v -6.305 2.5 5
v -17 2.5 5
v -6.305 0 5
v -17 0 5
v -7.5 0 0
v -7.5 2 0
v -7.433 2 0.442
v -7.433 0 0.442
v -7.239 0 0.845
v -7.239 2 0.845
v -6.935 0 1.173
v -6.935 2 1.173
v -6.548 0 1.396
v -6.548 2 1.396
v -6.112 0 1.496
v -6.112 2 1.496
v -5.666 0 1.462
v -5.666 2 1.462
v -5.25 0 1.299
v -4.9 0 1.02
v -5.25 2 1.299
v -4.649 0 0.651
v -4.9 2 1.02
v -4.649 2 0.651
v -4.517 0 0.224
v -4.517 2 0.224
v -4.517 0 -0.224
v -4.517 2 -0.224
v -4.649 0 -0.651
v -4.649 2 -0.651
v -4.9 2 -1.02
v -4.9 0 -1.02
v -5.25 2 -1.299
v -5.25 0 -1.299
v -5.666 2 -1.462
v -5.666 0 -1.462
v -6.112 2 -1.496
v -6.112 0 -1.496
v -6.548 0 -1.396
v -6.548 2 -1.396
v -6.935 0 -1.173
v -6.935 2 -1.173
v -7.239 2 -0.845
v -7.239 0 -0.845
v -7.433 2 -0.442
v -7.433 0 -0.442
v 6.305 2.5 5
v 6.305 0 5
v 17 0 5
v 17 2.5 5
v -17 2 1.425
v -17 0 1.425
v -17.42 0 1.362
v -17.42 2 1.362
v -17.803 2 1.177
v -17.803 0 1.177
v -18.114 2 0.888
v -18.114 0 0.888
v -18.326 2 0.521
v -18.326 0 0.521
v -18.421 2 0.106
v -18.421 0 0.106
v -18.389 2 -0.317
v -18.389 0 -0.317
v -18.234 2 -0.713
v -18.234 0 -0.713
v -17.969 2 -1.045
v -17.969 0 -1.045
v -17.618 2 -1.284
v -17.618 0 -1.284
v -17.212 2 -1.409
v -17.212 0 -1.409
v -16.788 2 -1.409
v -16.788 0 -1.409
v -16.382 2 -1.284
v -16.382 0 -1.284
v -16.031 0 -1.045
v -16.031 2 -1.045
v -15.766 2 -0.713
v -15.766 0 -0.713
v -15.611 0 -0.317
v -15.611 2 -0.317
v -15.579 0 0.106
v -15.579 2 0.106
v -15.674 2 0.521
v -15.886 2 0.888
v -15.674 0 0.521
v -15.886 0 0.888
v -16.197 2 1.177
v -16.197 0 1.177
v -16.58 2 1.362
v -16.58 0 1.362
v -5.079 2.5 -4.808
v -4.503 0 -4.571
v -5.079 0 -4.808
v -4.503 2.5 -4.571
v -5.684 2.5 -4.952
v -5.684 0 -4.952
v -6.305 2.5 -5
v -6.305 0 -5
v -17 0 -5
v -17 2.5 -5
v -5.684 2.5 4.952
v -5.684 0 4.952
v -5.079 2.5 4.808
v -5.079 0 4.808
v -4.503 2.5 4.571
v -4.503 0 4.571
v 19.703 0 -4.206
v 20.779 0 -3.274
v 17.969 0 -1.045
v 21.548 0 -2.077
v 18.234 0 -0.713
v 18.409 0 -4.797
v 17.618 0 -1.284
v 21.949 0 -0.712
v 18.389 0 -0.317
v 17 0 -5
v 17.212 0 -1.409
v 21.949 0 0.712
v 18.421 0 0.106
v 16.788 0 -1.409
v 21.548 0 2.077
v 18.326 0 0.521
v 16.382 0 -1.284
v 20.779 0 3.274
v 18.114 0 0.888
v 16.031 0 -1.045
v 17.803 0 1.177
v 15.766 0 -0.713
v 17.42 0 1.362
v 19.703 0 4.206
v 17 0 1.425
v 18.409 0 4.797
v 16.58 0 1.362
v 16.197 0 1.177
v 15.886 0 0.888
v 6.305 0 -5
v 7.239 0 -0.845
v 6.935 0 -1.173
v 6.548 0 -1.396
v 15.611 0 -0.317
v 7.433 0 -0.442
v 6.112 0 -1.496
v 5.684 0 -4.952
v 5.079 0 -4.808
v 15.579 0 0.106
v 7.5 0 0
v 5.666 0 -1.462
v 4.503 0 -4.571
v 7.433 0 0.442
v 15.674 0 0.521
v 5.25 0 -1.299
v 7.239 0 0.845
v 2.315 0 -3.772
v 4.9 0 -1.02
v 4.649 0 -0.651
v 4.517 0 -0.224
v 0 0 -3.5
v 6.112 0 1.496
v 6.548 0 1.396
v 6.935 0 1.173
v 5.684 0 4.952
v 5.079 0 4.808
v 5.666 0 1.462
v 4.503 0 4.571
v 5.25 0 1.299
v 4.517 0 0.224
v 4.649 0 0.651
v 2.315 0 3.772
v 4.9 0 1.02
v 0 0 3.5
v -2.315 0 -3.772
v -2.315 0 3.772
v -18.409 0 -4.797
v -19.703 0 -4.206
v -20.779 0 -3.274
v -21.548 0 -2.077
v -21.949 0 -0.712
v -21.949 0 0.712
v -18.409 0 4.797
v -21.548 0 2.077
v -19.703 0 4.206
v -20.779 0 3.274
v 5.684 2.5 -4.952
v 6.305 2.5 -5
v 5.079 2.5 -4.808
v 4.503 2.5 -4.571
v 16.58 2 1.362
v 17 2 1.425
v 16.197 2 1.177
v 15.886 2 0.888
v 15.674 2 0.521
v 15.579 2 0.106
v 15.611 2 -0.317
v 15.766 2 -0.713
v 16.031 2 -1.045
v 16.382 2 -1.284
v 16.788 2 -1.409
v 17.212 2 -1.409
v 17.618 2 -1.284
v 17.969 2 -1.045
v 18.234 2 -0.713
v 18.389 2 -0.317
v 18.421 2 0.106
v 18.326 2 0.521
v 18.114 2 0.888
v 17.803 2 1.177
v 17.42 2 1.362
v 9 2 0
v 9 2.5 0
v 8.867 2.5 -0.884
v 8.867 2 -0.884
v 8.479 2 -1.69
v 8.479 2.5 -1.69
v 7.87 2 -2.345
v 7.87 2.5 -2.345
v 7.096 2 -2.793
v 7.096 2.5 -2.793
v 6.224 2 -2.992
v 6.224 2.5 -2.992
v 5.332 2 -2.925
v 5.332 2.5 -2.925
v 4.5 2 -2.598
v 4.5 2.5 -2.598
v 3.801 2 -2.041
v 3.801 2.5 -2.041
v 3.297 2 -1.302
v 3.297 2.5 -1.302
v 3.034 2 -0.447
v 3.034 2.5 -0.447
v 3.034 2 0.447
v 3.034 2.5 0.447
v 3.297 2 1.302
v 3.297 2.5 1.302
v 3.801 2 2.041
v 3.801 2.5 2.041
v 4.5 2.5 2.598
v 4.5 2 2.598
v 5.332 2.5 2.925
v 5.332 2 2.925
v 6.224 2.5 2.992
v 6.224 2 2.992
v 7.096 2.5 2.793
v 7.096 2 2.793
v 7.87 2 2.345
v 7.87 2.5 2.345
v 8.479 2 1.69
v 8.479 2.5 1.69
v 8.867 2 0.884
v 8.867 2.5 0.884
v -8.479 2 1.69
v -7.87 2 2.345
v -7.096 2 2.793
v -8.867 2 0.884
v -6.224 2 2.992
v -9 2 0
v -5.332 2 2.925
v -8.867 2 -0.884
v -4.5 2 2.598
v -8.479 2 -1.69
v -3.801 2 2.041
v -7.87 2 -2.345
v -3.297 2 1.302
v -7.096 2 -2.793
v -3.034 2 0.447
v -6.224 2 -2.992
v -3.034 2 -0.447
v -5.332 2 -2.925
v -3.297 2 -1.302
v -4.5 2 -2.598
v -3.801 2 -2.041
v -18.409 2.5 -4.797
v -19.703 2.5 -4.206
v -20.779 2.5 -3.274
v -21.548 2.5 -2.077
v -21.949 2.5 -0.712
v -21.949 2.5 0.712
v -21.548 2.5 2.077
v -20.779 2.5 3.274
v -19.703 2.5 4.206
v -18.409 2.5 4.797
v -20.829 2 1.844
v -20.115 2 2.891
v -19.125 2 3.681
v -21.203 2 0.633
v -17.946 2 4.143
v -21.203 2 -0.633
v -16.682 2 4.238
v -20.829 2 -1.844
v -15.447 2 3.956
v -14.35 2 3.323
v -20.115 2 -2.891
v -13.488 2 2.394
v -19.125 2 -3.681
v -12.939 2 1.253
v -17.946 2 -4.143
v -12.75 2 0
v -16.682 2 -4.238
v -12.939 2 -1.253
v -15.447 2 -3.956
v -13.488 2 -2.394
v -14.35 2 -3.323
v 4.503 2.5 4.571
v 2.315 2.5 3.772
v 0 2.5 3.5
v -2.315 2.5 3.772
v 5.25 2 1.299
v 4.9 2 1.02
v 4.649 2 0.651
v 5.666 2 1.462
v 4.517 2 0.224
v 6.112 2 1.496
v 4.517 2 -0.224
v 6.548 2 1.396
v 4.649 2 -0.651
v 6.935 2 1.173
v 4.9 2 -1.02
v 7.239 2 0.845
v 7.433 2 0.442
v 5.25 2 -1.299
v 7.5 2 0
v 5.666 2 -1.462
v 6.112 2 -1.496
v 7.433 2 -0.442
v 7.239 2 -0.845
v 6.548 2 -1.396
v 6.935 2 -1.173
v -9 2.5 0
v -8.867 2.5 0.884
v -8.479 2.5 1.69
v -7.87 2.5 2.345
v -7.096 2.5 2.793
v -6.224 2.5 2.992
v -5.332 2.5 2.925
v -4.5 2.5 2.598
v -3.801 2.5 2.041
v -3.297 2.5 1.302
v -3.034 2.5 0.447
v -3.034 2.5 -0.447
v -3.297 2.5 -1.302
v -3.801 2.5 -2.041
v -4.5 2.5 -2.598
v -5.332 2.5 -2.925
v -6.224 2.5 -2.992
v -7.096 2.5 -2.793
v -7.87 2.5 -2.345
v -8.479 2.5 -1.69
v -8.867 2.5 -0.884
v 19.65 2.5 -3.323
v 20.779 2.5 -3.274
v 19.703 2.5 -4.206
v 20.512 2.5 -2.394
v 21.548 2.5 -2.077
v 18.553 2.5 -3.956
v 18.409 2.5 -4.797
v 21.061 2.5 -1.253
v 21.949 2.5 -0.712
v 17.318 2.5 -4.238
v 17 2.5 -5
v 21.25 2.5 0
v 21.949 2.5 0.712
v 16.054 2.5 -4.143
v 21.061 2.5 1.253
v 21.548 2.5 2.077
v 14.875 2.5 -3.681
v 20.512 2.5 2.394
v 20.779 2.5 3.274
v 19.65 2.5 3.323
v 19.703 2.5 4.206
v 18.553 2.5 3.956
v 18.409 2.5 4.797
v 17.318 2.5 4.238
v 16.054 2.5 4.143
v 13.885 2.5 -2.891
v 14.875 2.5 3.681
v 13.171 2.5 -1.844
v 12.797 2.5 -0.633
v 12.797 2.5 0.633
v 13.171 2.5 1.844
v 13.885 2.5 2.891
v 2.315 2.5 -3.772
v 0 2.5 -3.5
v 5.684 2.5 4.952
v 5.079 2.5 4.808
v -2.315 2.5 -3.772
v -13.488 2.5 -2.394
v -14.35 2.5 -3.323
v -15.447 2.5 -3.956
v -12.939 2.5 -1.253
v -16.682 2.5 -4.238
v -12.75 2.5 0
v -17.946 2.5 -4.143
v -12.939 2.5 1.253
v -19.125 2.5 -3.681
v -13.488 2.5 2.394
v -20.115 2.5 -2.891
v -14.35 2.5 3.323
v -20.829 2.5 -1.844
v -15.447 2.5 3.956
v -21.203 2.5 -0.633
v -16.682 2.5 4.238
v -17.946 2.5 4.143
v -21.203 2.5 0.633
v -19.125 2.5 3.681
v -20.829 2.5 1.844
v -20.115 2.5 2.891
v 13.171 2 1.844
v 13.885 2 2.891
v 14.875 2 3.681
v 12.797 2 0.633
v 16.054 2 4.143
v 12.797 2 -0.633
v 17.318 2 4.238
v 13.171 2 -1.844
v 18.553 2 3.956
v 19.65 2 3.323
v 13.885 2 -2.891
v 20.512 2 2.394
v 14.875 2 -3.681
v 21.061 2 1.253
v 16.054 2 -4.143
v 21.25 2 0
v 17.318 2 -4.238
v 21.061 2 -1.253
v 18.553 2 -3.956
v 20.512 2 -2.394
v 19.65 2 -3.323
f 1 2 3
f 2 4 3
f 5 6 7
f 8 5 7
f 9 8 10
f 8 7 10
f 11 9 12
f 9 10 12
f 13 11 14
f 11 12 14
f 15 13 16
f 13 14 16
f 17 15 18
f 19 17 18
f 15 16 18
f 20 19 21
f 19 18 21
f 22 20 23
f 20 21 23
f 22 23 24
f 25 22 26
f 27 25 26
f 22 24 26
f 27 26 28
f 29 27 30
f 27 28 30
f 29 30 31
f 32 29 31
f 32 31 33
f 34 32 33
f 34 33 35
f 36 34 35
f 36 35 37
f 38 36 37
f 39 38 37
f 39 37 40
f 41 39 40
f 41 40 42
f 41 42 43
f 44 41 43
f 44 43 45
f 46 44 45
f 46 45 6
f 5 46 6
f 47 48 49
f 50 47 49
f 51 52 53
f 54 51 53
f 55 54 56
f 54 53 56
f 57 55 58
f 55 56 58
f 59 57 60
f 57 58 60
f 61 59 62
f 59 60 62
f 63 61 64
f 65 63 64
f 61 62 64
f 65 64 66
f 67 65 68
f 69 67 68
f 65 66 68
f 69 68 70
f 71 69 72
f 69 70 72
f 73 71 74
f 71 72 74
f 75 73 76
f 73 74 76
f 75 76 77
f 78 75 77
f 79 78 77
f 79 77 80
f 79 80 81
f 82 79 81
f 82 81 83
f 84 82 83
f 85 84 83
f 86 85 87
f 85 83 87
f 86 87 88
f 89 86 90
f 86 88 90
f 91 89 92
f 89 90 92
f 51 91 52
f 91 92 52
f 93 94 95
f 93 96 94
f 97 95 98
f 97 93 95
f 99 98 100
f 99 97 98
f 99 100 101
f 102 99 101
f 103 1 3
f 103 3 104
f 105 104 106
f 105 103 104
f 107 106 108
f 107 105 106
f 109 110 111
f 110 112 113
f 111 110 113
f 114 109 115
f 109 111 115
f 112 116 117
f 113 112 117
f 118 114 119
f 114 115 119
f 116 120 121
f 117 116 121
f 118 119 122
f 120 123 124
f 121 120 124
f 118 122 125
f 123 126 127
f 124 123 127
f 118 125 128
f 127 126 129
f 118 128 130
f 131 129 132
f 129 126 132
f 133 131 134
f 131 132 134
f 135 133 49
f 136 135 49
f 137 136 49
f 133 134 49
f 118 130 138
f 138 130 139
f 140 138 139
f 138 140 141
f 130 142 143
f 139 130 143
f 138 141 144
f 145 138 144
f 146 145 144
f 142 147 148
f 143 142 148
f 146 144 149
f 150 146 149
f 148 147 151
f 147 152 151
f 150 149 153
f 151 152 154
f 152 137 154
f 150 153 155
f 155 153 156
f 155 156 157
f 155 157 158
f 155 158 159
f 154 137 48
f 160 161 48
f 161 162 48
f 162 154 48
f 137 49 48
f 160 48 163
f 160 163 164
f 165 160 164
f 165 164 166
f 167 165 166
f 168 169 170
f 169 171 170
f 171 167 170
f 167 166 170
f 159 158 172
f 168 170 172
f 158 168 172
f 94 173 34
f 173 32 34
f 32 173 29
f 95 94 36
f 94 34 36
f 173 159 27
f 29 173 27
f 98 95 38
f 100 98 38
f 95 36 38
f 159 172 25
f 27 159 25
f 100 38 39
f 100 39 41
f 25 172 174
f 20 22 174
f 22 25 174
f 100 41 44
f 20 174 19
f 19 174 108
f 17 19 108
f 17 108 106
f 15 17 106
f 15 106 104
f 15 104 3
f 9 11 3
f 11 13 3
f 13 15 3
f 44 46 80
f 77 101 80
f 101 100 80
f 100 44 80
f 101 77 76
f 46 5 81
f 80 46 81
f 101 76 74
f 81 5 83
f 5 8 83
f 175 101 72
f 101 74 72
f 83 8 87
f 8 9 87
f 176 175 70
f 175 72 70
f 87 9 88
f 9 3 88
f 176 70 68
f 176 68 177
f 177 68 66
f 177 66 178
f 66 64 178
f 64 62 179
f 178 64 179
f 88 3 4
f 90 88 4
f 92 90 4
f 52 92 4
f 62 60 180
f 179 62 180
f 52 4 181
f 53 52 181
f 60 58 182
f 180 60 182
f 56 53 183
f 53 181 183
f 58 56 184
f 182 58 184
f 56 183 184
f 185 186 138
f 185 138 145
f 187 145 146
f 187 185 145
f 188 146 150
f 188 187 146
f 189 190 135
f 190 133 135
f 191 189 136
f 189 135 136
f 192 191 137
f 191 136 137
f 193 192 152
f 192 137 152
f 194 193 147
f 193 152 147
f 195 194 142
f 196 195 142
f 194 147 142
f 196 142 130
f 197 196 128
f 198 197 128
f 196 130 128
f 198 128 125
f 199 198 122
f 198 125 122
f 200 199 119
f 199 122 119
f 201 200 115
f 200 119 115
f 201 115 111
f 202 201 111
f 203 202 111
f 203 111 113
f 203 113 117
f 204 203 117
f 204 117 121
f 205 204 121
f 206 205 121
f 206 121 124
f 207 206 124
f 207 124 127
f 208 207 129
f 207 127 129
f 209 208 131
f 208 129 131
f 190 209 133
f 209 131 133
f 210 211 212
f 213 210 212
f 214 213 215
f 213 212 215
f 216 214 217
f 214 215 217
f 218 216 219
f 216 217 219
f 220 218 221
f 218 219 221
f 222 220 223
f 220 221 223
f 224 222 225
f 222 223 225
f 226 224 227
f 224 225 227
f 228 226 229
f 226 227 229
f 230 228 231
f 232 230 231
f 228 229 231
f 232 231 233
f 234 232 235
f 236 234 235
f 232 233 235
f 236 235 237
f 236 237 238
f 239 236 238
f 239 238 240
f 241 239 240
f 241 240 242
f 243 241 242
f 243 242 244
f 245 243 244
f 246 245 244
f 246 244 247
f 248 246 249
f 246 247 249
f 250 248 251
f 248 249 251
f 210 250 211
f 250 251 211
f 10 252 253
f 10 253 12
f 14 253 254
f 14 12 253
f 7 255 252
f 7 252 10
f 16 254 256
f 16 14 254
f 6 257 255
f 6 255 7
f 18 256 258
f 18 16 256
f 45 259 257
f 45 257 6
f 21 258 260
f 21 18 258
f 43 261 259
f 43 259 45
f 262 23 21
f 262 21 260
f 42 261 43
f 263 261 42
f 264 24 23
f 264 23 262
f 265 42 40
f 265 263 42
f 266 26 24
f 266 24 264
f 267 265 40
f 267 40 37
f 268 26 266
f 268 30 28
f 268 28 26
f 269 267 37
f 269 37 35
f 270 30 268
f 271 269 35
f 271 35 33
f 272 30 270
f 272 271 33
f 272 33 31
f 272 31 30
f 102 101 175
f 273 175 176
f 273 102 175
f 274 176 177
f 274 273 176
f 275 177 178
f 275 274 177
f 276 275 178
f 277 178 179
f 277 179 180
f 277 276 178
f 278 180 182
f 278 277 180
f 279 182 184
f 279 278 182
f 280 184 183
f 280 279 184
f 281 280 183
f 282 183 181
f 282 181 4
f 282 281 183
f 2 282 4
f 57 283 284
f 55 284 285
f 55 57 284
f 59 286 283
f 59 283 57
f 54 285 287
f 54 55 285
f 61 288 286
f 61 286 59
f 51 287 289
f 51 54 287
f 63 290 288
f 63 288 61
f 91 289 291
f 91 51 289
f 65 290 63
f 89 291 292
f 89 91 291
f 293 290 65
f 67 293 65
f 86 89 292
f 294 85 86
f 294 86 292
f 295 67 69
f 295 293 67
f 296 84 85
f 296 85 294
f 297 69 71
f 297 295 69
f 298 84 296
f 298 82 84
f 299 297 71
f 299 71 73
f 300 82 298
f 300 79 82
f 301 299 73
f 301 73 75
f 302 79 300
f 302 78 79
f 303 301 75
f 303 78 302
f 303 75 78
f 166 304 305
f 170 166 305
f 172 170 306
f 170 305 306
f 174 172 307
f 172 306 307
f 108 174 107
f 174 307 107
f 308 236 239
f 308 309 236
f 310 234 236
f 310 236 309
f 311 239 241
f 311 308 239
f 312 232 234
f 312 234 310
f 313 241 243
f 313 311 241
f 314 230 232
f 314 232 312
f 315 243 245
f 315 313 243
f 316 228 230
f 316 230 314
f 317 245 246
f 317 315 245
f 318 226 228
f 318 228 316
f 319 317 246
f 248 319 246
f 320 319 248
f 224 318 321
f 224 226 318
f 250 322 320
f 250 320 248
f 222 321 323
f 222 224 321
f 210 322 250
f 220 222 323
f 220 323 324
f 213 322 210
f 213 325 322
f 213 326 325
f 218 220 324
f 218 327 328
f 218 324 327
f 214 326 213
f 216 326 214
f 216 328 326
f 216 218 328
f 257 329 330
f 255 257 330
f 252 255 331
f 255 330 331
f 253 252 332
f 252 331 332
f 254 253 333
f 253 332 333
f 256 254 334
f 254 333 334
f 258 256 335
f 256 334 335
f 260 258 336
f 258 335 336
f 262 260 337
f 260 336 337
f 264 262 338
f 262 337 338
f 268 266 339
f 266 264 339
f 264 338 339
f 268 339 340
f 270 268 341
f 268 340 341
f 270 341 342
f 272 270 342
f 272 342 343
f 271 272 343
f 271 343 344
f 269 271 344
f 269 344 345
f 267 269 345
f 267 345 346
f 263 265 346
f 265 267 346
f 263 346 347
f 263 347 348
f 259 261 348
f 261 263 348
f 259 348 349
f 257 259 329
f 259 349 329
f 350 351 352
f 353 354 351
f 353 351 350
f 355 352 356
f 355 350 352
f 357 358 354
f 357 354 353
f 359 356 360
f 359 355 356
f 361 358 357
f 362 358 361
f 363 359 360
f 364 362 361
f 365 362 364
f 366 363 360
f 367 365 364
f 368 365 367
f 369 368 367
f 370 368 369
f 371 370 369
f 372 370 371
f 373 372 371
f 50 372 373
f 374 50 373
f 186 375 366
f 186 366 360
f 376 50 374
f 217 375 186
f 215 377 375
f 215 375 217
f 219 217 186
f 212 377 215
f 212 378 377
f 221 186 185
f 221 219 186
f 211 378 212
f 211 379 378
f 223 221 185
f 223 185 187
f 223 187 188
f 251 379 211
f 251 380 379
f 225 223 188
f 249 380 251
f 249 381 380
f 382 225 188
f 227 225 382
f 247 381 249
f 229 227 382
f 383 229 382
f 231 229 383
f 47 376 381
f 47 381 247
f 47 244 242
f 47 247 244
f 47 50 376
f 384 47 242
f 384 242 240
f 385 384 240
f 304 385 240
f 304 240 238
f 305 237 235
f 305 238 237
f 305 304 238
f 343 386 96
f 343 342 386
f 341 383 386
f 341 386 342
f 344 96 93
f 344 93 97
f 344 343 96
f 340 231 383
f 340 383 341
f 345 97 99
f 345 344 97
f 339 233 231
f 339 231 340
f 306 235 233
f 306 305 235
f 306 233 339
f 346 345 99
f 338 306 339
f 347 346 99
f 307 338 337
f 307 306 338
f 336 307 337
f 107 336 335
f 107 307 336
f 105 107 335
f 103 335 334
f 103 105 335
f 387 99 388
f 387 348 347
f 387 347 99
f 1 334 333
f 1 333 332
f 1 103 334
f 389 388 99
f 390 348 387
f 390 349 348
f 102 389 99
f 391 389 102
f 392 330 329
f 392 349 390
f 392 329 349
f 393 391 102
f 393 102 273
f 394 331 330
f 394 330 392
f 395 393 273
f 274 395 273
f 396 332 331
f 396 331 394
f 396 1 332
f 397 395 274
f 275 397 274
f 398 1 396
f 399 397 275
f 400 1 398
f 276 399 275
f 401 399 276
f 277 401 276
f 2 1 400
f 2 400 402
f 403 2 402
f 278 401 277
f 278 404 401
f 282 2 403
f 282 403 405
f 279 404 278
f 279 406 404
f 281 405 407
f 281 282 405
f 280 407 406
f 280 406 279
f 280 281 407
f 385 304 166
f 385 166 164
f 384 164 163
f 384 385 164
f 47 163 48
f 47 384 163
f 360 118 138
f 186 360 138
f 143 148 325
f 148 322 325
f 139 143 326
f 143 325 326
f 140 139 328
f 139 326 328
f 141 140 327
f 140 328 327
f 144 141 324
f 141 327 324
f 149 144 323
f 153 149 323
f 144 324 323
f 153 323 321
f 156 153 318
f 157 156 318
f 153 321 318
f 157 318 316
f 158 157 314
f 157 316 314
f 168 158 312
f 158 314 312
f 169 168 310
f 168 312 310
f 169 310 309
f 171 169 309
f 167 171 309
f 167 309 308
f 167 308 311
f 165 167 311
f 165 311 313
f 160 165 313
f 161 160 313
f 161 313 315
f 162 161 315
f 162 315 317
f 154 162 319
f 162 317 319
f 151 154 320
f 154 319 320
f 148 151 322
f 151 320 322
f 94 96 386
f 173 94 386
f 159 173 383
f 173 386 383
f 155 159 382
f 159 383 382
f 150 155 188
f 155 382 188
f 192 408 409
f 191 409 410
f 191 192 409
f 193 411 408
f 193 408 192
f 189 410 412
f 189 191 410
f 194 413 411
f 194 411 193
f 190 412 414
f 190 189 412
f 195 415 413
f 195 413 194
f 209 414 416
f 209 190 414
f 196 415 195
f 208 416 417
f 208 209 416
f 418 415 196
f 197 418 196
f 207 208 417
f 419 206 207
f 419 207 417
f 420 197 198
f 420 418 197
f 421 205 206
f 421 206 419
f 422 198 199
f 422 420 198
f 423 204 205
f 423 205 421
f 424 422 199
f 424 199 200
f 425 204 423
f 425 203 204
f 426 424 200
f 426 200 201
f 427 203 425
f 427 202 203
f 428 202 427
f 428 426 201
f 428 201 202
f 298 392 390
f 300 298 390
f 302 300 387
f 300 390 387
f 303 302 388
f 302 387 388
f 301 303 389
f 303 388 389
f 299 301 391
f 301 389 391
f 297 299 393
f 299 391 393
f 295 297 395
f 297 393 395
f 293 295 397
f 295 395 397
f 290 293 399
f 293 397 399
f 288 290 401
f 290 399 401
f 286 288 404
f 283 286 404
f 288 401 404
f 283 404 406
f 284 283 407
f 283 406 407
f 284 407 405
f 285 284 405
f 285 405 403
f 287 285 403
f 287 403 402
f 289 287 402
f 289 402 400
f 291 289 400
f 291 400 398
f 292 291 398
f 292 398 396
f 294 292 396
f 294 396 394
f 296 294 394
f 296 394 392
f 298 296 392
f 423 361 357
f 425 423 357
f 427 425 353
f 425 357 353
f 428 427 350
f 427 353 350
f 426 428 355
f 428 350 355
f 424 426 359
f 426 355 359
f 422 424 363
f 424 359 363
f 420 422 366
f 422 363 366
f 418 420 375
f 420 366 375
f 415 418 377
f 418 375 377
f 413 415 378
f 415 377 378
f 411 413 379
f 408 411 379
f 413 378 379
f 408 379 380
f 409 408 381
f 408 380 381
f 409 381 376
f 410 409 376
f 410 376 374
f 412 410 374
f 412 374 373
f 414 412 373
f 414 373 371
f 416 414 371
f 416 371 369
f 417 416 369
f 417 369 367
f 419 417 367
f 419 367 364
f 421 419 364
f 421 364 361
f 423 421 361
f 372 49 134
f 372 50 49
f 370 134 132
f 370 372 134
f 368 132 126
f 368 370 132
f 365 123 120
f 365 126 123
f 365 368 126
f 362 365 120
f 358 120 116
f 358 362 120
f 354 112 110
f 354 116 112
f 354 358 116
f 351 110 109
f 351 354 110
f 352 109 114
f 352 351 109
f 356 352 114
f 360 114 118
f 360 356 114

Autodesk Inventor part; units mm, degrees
ref_plane "YZ Plane" through (0, 0, 0) normal (1, 0, 0) x (0, 1, 0)
ref_plane "XZ Plane" through (0, 0, 0) normal (0, 1, 0) x (-1, 0, 0)
ref_plane "XY Plane" through (0, 0, 0) normal (0, 0, 1) x (1, 0, 0)
sketch "Sketch1" plane through (0, 0, 0) normal (0, 1, 0) x (-1, 0, 0)
  line L0 (17, 5) -> (-17, 5)
  line L1 (-17, 5) -> (-17, -5)
  line L2 (-17, -5) -> (17, -5)
  line L3 (17, -5) -> (17, 5)
  line L4 (17, 5) -> (-17, -5) construction
  line L5 (-17, 5) -> (17, -5) construction
  point P0 (0, 0)
  dimension "d0" = 34
  dimension "d1" = 10
extrude "Extrusion1" add sketch "Sketch1" along normal blind 2.5
sketch "Sketch2" plane through (0, 2.5, 0) normal (0, 1, 0) x (1, 0, 0)
  line L0 (-17, 5) -> (-17, -5) projected
  circle A0 centre (-17, 0) radius 5
  line L1 (17, -5) -> (17, 5) projected
  circle A1 centre (17, 0) radius 5
  point P0 (0, 0)
extrude "Extrusion2" add sketch "Sketch2" against normal blind 2.5
sketch "Sketch3" plane through (0, 2.5, 0) normal (0, 1, 0) x (1, 0, 0)
  arc A0 (-17, 5) -> (-17, -5) centre (-17, 0) ccw projected
  circle A1 centre (-17, 0) radius 1.5
  arc A2 (17, -5) -> (17, 5) centre (17, 0) ccw projected
  circle A3 centre (17, 0) radius 1.5
  point P0 (0, 0)
  dimension "d6" = 3
  dimension "d7" = 3
hole "Hole1" at (-17, 2.5, 0) at (17, 2.5, 0) direction (0, -1, 0) diameter 2.85 end through all thread size "M3.5x0.6" class "6H" standard "ISO Metric profile"
sketch "Sketch4" plane through (0, 2.5, 0) normal (0, 1, 0) x (1, 0, 0)
  circle A0 centre (-17, 0) radius 4.25
  arc A1 (-17, 5) -> (-17, -5) centre (-17, 0) ccw projected
  arc A2 (17, -5) -> (17, 5) centre (17, 0) ccw projected
  circle A3 centre (17, 0) radius 4.25
  point P0 (0, 0)
  dimension "d15" = 8.5
  dimension "d16" = 8.5
extrude "Extrusion3" cut sketch "Sketch4" against normal blind 0.5
sketch "Sketch5" plane through (0, 2.5, 0) normal (0, 1, 0) x (1, 0, 0)
  circle A0 centre (0, 5) radius 1.5
  circle A1 centre (0, -5) radius 1.5
  circle A2 centre (0, 13.5) radius 10
  point P0 (0, 0)
  dimension "d19" = 3
  dimension "d20" = 5
  dimension "d21" = 3
  dimension "d22" = 5
  dimension "d23" = 20
extrude "Extrusion4" cut sketch "Sketch5" against normal through all contours A0 | A2
mirror "Mirror1" about plane through (0, 0, 0) normal (0, 0, 1) of "Extrusion4"
sketch "Sketch6" plane through (0, 2.5, 0) normal (0, 1, 0) x (1, 0, 0)
  circle A0 centre (6, 0) radius 3
  point P0 (0, 0)
  dimension "d26" = 6
  dimension "d27" = 6
extrude "Extrusion5" cut sketch "Sketch6" against normal blind 0.5
sketch "Sketch7" plane through (6, 2, 0) normal (0, 1, 0) x (1, 0, 0)
  circle A0 centre (0, 0) radius 3 projected
  circle A1 centre (0, 0) radius 1.5
  point P0 (-6, 0)
  dimension "d30" = 3
extrude "Extrusion6" cut sketch "Sketch7" against normal through all contours A1
mirror "Mirror2" about plane through (0, 0, 0) normal (1, 0, 0) of "Extrusion5", "Extrusion6"
fillet "Fillet1" radius 4 4 edges at (5.2678, 1.25, 5) (-5.2678, 1.25, 5) (5.2678, 1.25, -5) (-5.2678, 1.25, -5)
properties part number "Tarot-mr4008-blade-adapter"
